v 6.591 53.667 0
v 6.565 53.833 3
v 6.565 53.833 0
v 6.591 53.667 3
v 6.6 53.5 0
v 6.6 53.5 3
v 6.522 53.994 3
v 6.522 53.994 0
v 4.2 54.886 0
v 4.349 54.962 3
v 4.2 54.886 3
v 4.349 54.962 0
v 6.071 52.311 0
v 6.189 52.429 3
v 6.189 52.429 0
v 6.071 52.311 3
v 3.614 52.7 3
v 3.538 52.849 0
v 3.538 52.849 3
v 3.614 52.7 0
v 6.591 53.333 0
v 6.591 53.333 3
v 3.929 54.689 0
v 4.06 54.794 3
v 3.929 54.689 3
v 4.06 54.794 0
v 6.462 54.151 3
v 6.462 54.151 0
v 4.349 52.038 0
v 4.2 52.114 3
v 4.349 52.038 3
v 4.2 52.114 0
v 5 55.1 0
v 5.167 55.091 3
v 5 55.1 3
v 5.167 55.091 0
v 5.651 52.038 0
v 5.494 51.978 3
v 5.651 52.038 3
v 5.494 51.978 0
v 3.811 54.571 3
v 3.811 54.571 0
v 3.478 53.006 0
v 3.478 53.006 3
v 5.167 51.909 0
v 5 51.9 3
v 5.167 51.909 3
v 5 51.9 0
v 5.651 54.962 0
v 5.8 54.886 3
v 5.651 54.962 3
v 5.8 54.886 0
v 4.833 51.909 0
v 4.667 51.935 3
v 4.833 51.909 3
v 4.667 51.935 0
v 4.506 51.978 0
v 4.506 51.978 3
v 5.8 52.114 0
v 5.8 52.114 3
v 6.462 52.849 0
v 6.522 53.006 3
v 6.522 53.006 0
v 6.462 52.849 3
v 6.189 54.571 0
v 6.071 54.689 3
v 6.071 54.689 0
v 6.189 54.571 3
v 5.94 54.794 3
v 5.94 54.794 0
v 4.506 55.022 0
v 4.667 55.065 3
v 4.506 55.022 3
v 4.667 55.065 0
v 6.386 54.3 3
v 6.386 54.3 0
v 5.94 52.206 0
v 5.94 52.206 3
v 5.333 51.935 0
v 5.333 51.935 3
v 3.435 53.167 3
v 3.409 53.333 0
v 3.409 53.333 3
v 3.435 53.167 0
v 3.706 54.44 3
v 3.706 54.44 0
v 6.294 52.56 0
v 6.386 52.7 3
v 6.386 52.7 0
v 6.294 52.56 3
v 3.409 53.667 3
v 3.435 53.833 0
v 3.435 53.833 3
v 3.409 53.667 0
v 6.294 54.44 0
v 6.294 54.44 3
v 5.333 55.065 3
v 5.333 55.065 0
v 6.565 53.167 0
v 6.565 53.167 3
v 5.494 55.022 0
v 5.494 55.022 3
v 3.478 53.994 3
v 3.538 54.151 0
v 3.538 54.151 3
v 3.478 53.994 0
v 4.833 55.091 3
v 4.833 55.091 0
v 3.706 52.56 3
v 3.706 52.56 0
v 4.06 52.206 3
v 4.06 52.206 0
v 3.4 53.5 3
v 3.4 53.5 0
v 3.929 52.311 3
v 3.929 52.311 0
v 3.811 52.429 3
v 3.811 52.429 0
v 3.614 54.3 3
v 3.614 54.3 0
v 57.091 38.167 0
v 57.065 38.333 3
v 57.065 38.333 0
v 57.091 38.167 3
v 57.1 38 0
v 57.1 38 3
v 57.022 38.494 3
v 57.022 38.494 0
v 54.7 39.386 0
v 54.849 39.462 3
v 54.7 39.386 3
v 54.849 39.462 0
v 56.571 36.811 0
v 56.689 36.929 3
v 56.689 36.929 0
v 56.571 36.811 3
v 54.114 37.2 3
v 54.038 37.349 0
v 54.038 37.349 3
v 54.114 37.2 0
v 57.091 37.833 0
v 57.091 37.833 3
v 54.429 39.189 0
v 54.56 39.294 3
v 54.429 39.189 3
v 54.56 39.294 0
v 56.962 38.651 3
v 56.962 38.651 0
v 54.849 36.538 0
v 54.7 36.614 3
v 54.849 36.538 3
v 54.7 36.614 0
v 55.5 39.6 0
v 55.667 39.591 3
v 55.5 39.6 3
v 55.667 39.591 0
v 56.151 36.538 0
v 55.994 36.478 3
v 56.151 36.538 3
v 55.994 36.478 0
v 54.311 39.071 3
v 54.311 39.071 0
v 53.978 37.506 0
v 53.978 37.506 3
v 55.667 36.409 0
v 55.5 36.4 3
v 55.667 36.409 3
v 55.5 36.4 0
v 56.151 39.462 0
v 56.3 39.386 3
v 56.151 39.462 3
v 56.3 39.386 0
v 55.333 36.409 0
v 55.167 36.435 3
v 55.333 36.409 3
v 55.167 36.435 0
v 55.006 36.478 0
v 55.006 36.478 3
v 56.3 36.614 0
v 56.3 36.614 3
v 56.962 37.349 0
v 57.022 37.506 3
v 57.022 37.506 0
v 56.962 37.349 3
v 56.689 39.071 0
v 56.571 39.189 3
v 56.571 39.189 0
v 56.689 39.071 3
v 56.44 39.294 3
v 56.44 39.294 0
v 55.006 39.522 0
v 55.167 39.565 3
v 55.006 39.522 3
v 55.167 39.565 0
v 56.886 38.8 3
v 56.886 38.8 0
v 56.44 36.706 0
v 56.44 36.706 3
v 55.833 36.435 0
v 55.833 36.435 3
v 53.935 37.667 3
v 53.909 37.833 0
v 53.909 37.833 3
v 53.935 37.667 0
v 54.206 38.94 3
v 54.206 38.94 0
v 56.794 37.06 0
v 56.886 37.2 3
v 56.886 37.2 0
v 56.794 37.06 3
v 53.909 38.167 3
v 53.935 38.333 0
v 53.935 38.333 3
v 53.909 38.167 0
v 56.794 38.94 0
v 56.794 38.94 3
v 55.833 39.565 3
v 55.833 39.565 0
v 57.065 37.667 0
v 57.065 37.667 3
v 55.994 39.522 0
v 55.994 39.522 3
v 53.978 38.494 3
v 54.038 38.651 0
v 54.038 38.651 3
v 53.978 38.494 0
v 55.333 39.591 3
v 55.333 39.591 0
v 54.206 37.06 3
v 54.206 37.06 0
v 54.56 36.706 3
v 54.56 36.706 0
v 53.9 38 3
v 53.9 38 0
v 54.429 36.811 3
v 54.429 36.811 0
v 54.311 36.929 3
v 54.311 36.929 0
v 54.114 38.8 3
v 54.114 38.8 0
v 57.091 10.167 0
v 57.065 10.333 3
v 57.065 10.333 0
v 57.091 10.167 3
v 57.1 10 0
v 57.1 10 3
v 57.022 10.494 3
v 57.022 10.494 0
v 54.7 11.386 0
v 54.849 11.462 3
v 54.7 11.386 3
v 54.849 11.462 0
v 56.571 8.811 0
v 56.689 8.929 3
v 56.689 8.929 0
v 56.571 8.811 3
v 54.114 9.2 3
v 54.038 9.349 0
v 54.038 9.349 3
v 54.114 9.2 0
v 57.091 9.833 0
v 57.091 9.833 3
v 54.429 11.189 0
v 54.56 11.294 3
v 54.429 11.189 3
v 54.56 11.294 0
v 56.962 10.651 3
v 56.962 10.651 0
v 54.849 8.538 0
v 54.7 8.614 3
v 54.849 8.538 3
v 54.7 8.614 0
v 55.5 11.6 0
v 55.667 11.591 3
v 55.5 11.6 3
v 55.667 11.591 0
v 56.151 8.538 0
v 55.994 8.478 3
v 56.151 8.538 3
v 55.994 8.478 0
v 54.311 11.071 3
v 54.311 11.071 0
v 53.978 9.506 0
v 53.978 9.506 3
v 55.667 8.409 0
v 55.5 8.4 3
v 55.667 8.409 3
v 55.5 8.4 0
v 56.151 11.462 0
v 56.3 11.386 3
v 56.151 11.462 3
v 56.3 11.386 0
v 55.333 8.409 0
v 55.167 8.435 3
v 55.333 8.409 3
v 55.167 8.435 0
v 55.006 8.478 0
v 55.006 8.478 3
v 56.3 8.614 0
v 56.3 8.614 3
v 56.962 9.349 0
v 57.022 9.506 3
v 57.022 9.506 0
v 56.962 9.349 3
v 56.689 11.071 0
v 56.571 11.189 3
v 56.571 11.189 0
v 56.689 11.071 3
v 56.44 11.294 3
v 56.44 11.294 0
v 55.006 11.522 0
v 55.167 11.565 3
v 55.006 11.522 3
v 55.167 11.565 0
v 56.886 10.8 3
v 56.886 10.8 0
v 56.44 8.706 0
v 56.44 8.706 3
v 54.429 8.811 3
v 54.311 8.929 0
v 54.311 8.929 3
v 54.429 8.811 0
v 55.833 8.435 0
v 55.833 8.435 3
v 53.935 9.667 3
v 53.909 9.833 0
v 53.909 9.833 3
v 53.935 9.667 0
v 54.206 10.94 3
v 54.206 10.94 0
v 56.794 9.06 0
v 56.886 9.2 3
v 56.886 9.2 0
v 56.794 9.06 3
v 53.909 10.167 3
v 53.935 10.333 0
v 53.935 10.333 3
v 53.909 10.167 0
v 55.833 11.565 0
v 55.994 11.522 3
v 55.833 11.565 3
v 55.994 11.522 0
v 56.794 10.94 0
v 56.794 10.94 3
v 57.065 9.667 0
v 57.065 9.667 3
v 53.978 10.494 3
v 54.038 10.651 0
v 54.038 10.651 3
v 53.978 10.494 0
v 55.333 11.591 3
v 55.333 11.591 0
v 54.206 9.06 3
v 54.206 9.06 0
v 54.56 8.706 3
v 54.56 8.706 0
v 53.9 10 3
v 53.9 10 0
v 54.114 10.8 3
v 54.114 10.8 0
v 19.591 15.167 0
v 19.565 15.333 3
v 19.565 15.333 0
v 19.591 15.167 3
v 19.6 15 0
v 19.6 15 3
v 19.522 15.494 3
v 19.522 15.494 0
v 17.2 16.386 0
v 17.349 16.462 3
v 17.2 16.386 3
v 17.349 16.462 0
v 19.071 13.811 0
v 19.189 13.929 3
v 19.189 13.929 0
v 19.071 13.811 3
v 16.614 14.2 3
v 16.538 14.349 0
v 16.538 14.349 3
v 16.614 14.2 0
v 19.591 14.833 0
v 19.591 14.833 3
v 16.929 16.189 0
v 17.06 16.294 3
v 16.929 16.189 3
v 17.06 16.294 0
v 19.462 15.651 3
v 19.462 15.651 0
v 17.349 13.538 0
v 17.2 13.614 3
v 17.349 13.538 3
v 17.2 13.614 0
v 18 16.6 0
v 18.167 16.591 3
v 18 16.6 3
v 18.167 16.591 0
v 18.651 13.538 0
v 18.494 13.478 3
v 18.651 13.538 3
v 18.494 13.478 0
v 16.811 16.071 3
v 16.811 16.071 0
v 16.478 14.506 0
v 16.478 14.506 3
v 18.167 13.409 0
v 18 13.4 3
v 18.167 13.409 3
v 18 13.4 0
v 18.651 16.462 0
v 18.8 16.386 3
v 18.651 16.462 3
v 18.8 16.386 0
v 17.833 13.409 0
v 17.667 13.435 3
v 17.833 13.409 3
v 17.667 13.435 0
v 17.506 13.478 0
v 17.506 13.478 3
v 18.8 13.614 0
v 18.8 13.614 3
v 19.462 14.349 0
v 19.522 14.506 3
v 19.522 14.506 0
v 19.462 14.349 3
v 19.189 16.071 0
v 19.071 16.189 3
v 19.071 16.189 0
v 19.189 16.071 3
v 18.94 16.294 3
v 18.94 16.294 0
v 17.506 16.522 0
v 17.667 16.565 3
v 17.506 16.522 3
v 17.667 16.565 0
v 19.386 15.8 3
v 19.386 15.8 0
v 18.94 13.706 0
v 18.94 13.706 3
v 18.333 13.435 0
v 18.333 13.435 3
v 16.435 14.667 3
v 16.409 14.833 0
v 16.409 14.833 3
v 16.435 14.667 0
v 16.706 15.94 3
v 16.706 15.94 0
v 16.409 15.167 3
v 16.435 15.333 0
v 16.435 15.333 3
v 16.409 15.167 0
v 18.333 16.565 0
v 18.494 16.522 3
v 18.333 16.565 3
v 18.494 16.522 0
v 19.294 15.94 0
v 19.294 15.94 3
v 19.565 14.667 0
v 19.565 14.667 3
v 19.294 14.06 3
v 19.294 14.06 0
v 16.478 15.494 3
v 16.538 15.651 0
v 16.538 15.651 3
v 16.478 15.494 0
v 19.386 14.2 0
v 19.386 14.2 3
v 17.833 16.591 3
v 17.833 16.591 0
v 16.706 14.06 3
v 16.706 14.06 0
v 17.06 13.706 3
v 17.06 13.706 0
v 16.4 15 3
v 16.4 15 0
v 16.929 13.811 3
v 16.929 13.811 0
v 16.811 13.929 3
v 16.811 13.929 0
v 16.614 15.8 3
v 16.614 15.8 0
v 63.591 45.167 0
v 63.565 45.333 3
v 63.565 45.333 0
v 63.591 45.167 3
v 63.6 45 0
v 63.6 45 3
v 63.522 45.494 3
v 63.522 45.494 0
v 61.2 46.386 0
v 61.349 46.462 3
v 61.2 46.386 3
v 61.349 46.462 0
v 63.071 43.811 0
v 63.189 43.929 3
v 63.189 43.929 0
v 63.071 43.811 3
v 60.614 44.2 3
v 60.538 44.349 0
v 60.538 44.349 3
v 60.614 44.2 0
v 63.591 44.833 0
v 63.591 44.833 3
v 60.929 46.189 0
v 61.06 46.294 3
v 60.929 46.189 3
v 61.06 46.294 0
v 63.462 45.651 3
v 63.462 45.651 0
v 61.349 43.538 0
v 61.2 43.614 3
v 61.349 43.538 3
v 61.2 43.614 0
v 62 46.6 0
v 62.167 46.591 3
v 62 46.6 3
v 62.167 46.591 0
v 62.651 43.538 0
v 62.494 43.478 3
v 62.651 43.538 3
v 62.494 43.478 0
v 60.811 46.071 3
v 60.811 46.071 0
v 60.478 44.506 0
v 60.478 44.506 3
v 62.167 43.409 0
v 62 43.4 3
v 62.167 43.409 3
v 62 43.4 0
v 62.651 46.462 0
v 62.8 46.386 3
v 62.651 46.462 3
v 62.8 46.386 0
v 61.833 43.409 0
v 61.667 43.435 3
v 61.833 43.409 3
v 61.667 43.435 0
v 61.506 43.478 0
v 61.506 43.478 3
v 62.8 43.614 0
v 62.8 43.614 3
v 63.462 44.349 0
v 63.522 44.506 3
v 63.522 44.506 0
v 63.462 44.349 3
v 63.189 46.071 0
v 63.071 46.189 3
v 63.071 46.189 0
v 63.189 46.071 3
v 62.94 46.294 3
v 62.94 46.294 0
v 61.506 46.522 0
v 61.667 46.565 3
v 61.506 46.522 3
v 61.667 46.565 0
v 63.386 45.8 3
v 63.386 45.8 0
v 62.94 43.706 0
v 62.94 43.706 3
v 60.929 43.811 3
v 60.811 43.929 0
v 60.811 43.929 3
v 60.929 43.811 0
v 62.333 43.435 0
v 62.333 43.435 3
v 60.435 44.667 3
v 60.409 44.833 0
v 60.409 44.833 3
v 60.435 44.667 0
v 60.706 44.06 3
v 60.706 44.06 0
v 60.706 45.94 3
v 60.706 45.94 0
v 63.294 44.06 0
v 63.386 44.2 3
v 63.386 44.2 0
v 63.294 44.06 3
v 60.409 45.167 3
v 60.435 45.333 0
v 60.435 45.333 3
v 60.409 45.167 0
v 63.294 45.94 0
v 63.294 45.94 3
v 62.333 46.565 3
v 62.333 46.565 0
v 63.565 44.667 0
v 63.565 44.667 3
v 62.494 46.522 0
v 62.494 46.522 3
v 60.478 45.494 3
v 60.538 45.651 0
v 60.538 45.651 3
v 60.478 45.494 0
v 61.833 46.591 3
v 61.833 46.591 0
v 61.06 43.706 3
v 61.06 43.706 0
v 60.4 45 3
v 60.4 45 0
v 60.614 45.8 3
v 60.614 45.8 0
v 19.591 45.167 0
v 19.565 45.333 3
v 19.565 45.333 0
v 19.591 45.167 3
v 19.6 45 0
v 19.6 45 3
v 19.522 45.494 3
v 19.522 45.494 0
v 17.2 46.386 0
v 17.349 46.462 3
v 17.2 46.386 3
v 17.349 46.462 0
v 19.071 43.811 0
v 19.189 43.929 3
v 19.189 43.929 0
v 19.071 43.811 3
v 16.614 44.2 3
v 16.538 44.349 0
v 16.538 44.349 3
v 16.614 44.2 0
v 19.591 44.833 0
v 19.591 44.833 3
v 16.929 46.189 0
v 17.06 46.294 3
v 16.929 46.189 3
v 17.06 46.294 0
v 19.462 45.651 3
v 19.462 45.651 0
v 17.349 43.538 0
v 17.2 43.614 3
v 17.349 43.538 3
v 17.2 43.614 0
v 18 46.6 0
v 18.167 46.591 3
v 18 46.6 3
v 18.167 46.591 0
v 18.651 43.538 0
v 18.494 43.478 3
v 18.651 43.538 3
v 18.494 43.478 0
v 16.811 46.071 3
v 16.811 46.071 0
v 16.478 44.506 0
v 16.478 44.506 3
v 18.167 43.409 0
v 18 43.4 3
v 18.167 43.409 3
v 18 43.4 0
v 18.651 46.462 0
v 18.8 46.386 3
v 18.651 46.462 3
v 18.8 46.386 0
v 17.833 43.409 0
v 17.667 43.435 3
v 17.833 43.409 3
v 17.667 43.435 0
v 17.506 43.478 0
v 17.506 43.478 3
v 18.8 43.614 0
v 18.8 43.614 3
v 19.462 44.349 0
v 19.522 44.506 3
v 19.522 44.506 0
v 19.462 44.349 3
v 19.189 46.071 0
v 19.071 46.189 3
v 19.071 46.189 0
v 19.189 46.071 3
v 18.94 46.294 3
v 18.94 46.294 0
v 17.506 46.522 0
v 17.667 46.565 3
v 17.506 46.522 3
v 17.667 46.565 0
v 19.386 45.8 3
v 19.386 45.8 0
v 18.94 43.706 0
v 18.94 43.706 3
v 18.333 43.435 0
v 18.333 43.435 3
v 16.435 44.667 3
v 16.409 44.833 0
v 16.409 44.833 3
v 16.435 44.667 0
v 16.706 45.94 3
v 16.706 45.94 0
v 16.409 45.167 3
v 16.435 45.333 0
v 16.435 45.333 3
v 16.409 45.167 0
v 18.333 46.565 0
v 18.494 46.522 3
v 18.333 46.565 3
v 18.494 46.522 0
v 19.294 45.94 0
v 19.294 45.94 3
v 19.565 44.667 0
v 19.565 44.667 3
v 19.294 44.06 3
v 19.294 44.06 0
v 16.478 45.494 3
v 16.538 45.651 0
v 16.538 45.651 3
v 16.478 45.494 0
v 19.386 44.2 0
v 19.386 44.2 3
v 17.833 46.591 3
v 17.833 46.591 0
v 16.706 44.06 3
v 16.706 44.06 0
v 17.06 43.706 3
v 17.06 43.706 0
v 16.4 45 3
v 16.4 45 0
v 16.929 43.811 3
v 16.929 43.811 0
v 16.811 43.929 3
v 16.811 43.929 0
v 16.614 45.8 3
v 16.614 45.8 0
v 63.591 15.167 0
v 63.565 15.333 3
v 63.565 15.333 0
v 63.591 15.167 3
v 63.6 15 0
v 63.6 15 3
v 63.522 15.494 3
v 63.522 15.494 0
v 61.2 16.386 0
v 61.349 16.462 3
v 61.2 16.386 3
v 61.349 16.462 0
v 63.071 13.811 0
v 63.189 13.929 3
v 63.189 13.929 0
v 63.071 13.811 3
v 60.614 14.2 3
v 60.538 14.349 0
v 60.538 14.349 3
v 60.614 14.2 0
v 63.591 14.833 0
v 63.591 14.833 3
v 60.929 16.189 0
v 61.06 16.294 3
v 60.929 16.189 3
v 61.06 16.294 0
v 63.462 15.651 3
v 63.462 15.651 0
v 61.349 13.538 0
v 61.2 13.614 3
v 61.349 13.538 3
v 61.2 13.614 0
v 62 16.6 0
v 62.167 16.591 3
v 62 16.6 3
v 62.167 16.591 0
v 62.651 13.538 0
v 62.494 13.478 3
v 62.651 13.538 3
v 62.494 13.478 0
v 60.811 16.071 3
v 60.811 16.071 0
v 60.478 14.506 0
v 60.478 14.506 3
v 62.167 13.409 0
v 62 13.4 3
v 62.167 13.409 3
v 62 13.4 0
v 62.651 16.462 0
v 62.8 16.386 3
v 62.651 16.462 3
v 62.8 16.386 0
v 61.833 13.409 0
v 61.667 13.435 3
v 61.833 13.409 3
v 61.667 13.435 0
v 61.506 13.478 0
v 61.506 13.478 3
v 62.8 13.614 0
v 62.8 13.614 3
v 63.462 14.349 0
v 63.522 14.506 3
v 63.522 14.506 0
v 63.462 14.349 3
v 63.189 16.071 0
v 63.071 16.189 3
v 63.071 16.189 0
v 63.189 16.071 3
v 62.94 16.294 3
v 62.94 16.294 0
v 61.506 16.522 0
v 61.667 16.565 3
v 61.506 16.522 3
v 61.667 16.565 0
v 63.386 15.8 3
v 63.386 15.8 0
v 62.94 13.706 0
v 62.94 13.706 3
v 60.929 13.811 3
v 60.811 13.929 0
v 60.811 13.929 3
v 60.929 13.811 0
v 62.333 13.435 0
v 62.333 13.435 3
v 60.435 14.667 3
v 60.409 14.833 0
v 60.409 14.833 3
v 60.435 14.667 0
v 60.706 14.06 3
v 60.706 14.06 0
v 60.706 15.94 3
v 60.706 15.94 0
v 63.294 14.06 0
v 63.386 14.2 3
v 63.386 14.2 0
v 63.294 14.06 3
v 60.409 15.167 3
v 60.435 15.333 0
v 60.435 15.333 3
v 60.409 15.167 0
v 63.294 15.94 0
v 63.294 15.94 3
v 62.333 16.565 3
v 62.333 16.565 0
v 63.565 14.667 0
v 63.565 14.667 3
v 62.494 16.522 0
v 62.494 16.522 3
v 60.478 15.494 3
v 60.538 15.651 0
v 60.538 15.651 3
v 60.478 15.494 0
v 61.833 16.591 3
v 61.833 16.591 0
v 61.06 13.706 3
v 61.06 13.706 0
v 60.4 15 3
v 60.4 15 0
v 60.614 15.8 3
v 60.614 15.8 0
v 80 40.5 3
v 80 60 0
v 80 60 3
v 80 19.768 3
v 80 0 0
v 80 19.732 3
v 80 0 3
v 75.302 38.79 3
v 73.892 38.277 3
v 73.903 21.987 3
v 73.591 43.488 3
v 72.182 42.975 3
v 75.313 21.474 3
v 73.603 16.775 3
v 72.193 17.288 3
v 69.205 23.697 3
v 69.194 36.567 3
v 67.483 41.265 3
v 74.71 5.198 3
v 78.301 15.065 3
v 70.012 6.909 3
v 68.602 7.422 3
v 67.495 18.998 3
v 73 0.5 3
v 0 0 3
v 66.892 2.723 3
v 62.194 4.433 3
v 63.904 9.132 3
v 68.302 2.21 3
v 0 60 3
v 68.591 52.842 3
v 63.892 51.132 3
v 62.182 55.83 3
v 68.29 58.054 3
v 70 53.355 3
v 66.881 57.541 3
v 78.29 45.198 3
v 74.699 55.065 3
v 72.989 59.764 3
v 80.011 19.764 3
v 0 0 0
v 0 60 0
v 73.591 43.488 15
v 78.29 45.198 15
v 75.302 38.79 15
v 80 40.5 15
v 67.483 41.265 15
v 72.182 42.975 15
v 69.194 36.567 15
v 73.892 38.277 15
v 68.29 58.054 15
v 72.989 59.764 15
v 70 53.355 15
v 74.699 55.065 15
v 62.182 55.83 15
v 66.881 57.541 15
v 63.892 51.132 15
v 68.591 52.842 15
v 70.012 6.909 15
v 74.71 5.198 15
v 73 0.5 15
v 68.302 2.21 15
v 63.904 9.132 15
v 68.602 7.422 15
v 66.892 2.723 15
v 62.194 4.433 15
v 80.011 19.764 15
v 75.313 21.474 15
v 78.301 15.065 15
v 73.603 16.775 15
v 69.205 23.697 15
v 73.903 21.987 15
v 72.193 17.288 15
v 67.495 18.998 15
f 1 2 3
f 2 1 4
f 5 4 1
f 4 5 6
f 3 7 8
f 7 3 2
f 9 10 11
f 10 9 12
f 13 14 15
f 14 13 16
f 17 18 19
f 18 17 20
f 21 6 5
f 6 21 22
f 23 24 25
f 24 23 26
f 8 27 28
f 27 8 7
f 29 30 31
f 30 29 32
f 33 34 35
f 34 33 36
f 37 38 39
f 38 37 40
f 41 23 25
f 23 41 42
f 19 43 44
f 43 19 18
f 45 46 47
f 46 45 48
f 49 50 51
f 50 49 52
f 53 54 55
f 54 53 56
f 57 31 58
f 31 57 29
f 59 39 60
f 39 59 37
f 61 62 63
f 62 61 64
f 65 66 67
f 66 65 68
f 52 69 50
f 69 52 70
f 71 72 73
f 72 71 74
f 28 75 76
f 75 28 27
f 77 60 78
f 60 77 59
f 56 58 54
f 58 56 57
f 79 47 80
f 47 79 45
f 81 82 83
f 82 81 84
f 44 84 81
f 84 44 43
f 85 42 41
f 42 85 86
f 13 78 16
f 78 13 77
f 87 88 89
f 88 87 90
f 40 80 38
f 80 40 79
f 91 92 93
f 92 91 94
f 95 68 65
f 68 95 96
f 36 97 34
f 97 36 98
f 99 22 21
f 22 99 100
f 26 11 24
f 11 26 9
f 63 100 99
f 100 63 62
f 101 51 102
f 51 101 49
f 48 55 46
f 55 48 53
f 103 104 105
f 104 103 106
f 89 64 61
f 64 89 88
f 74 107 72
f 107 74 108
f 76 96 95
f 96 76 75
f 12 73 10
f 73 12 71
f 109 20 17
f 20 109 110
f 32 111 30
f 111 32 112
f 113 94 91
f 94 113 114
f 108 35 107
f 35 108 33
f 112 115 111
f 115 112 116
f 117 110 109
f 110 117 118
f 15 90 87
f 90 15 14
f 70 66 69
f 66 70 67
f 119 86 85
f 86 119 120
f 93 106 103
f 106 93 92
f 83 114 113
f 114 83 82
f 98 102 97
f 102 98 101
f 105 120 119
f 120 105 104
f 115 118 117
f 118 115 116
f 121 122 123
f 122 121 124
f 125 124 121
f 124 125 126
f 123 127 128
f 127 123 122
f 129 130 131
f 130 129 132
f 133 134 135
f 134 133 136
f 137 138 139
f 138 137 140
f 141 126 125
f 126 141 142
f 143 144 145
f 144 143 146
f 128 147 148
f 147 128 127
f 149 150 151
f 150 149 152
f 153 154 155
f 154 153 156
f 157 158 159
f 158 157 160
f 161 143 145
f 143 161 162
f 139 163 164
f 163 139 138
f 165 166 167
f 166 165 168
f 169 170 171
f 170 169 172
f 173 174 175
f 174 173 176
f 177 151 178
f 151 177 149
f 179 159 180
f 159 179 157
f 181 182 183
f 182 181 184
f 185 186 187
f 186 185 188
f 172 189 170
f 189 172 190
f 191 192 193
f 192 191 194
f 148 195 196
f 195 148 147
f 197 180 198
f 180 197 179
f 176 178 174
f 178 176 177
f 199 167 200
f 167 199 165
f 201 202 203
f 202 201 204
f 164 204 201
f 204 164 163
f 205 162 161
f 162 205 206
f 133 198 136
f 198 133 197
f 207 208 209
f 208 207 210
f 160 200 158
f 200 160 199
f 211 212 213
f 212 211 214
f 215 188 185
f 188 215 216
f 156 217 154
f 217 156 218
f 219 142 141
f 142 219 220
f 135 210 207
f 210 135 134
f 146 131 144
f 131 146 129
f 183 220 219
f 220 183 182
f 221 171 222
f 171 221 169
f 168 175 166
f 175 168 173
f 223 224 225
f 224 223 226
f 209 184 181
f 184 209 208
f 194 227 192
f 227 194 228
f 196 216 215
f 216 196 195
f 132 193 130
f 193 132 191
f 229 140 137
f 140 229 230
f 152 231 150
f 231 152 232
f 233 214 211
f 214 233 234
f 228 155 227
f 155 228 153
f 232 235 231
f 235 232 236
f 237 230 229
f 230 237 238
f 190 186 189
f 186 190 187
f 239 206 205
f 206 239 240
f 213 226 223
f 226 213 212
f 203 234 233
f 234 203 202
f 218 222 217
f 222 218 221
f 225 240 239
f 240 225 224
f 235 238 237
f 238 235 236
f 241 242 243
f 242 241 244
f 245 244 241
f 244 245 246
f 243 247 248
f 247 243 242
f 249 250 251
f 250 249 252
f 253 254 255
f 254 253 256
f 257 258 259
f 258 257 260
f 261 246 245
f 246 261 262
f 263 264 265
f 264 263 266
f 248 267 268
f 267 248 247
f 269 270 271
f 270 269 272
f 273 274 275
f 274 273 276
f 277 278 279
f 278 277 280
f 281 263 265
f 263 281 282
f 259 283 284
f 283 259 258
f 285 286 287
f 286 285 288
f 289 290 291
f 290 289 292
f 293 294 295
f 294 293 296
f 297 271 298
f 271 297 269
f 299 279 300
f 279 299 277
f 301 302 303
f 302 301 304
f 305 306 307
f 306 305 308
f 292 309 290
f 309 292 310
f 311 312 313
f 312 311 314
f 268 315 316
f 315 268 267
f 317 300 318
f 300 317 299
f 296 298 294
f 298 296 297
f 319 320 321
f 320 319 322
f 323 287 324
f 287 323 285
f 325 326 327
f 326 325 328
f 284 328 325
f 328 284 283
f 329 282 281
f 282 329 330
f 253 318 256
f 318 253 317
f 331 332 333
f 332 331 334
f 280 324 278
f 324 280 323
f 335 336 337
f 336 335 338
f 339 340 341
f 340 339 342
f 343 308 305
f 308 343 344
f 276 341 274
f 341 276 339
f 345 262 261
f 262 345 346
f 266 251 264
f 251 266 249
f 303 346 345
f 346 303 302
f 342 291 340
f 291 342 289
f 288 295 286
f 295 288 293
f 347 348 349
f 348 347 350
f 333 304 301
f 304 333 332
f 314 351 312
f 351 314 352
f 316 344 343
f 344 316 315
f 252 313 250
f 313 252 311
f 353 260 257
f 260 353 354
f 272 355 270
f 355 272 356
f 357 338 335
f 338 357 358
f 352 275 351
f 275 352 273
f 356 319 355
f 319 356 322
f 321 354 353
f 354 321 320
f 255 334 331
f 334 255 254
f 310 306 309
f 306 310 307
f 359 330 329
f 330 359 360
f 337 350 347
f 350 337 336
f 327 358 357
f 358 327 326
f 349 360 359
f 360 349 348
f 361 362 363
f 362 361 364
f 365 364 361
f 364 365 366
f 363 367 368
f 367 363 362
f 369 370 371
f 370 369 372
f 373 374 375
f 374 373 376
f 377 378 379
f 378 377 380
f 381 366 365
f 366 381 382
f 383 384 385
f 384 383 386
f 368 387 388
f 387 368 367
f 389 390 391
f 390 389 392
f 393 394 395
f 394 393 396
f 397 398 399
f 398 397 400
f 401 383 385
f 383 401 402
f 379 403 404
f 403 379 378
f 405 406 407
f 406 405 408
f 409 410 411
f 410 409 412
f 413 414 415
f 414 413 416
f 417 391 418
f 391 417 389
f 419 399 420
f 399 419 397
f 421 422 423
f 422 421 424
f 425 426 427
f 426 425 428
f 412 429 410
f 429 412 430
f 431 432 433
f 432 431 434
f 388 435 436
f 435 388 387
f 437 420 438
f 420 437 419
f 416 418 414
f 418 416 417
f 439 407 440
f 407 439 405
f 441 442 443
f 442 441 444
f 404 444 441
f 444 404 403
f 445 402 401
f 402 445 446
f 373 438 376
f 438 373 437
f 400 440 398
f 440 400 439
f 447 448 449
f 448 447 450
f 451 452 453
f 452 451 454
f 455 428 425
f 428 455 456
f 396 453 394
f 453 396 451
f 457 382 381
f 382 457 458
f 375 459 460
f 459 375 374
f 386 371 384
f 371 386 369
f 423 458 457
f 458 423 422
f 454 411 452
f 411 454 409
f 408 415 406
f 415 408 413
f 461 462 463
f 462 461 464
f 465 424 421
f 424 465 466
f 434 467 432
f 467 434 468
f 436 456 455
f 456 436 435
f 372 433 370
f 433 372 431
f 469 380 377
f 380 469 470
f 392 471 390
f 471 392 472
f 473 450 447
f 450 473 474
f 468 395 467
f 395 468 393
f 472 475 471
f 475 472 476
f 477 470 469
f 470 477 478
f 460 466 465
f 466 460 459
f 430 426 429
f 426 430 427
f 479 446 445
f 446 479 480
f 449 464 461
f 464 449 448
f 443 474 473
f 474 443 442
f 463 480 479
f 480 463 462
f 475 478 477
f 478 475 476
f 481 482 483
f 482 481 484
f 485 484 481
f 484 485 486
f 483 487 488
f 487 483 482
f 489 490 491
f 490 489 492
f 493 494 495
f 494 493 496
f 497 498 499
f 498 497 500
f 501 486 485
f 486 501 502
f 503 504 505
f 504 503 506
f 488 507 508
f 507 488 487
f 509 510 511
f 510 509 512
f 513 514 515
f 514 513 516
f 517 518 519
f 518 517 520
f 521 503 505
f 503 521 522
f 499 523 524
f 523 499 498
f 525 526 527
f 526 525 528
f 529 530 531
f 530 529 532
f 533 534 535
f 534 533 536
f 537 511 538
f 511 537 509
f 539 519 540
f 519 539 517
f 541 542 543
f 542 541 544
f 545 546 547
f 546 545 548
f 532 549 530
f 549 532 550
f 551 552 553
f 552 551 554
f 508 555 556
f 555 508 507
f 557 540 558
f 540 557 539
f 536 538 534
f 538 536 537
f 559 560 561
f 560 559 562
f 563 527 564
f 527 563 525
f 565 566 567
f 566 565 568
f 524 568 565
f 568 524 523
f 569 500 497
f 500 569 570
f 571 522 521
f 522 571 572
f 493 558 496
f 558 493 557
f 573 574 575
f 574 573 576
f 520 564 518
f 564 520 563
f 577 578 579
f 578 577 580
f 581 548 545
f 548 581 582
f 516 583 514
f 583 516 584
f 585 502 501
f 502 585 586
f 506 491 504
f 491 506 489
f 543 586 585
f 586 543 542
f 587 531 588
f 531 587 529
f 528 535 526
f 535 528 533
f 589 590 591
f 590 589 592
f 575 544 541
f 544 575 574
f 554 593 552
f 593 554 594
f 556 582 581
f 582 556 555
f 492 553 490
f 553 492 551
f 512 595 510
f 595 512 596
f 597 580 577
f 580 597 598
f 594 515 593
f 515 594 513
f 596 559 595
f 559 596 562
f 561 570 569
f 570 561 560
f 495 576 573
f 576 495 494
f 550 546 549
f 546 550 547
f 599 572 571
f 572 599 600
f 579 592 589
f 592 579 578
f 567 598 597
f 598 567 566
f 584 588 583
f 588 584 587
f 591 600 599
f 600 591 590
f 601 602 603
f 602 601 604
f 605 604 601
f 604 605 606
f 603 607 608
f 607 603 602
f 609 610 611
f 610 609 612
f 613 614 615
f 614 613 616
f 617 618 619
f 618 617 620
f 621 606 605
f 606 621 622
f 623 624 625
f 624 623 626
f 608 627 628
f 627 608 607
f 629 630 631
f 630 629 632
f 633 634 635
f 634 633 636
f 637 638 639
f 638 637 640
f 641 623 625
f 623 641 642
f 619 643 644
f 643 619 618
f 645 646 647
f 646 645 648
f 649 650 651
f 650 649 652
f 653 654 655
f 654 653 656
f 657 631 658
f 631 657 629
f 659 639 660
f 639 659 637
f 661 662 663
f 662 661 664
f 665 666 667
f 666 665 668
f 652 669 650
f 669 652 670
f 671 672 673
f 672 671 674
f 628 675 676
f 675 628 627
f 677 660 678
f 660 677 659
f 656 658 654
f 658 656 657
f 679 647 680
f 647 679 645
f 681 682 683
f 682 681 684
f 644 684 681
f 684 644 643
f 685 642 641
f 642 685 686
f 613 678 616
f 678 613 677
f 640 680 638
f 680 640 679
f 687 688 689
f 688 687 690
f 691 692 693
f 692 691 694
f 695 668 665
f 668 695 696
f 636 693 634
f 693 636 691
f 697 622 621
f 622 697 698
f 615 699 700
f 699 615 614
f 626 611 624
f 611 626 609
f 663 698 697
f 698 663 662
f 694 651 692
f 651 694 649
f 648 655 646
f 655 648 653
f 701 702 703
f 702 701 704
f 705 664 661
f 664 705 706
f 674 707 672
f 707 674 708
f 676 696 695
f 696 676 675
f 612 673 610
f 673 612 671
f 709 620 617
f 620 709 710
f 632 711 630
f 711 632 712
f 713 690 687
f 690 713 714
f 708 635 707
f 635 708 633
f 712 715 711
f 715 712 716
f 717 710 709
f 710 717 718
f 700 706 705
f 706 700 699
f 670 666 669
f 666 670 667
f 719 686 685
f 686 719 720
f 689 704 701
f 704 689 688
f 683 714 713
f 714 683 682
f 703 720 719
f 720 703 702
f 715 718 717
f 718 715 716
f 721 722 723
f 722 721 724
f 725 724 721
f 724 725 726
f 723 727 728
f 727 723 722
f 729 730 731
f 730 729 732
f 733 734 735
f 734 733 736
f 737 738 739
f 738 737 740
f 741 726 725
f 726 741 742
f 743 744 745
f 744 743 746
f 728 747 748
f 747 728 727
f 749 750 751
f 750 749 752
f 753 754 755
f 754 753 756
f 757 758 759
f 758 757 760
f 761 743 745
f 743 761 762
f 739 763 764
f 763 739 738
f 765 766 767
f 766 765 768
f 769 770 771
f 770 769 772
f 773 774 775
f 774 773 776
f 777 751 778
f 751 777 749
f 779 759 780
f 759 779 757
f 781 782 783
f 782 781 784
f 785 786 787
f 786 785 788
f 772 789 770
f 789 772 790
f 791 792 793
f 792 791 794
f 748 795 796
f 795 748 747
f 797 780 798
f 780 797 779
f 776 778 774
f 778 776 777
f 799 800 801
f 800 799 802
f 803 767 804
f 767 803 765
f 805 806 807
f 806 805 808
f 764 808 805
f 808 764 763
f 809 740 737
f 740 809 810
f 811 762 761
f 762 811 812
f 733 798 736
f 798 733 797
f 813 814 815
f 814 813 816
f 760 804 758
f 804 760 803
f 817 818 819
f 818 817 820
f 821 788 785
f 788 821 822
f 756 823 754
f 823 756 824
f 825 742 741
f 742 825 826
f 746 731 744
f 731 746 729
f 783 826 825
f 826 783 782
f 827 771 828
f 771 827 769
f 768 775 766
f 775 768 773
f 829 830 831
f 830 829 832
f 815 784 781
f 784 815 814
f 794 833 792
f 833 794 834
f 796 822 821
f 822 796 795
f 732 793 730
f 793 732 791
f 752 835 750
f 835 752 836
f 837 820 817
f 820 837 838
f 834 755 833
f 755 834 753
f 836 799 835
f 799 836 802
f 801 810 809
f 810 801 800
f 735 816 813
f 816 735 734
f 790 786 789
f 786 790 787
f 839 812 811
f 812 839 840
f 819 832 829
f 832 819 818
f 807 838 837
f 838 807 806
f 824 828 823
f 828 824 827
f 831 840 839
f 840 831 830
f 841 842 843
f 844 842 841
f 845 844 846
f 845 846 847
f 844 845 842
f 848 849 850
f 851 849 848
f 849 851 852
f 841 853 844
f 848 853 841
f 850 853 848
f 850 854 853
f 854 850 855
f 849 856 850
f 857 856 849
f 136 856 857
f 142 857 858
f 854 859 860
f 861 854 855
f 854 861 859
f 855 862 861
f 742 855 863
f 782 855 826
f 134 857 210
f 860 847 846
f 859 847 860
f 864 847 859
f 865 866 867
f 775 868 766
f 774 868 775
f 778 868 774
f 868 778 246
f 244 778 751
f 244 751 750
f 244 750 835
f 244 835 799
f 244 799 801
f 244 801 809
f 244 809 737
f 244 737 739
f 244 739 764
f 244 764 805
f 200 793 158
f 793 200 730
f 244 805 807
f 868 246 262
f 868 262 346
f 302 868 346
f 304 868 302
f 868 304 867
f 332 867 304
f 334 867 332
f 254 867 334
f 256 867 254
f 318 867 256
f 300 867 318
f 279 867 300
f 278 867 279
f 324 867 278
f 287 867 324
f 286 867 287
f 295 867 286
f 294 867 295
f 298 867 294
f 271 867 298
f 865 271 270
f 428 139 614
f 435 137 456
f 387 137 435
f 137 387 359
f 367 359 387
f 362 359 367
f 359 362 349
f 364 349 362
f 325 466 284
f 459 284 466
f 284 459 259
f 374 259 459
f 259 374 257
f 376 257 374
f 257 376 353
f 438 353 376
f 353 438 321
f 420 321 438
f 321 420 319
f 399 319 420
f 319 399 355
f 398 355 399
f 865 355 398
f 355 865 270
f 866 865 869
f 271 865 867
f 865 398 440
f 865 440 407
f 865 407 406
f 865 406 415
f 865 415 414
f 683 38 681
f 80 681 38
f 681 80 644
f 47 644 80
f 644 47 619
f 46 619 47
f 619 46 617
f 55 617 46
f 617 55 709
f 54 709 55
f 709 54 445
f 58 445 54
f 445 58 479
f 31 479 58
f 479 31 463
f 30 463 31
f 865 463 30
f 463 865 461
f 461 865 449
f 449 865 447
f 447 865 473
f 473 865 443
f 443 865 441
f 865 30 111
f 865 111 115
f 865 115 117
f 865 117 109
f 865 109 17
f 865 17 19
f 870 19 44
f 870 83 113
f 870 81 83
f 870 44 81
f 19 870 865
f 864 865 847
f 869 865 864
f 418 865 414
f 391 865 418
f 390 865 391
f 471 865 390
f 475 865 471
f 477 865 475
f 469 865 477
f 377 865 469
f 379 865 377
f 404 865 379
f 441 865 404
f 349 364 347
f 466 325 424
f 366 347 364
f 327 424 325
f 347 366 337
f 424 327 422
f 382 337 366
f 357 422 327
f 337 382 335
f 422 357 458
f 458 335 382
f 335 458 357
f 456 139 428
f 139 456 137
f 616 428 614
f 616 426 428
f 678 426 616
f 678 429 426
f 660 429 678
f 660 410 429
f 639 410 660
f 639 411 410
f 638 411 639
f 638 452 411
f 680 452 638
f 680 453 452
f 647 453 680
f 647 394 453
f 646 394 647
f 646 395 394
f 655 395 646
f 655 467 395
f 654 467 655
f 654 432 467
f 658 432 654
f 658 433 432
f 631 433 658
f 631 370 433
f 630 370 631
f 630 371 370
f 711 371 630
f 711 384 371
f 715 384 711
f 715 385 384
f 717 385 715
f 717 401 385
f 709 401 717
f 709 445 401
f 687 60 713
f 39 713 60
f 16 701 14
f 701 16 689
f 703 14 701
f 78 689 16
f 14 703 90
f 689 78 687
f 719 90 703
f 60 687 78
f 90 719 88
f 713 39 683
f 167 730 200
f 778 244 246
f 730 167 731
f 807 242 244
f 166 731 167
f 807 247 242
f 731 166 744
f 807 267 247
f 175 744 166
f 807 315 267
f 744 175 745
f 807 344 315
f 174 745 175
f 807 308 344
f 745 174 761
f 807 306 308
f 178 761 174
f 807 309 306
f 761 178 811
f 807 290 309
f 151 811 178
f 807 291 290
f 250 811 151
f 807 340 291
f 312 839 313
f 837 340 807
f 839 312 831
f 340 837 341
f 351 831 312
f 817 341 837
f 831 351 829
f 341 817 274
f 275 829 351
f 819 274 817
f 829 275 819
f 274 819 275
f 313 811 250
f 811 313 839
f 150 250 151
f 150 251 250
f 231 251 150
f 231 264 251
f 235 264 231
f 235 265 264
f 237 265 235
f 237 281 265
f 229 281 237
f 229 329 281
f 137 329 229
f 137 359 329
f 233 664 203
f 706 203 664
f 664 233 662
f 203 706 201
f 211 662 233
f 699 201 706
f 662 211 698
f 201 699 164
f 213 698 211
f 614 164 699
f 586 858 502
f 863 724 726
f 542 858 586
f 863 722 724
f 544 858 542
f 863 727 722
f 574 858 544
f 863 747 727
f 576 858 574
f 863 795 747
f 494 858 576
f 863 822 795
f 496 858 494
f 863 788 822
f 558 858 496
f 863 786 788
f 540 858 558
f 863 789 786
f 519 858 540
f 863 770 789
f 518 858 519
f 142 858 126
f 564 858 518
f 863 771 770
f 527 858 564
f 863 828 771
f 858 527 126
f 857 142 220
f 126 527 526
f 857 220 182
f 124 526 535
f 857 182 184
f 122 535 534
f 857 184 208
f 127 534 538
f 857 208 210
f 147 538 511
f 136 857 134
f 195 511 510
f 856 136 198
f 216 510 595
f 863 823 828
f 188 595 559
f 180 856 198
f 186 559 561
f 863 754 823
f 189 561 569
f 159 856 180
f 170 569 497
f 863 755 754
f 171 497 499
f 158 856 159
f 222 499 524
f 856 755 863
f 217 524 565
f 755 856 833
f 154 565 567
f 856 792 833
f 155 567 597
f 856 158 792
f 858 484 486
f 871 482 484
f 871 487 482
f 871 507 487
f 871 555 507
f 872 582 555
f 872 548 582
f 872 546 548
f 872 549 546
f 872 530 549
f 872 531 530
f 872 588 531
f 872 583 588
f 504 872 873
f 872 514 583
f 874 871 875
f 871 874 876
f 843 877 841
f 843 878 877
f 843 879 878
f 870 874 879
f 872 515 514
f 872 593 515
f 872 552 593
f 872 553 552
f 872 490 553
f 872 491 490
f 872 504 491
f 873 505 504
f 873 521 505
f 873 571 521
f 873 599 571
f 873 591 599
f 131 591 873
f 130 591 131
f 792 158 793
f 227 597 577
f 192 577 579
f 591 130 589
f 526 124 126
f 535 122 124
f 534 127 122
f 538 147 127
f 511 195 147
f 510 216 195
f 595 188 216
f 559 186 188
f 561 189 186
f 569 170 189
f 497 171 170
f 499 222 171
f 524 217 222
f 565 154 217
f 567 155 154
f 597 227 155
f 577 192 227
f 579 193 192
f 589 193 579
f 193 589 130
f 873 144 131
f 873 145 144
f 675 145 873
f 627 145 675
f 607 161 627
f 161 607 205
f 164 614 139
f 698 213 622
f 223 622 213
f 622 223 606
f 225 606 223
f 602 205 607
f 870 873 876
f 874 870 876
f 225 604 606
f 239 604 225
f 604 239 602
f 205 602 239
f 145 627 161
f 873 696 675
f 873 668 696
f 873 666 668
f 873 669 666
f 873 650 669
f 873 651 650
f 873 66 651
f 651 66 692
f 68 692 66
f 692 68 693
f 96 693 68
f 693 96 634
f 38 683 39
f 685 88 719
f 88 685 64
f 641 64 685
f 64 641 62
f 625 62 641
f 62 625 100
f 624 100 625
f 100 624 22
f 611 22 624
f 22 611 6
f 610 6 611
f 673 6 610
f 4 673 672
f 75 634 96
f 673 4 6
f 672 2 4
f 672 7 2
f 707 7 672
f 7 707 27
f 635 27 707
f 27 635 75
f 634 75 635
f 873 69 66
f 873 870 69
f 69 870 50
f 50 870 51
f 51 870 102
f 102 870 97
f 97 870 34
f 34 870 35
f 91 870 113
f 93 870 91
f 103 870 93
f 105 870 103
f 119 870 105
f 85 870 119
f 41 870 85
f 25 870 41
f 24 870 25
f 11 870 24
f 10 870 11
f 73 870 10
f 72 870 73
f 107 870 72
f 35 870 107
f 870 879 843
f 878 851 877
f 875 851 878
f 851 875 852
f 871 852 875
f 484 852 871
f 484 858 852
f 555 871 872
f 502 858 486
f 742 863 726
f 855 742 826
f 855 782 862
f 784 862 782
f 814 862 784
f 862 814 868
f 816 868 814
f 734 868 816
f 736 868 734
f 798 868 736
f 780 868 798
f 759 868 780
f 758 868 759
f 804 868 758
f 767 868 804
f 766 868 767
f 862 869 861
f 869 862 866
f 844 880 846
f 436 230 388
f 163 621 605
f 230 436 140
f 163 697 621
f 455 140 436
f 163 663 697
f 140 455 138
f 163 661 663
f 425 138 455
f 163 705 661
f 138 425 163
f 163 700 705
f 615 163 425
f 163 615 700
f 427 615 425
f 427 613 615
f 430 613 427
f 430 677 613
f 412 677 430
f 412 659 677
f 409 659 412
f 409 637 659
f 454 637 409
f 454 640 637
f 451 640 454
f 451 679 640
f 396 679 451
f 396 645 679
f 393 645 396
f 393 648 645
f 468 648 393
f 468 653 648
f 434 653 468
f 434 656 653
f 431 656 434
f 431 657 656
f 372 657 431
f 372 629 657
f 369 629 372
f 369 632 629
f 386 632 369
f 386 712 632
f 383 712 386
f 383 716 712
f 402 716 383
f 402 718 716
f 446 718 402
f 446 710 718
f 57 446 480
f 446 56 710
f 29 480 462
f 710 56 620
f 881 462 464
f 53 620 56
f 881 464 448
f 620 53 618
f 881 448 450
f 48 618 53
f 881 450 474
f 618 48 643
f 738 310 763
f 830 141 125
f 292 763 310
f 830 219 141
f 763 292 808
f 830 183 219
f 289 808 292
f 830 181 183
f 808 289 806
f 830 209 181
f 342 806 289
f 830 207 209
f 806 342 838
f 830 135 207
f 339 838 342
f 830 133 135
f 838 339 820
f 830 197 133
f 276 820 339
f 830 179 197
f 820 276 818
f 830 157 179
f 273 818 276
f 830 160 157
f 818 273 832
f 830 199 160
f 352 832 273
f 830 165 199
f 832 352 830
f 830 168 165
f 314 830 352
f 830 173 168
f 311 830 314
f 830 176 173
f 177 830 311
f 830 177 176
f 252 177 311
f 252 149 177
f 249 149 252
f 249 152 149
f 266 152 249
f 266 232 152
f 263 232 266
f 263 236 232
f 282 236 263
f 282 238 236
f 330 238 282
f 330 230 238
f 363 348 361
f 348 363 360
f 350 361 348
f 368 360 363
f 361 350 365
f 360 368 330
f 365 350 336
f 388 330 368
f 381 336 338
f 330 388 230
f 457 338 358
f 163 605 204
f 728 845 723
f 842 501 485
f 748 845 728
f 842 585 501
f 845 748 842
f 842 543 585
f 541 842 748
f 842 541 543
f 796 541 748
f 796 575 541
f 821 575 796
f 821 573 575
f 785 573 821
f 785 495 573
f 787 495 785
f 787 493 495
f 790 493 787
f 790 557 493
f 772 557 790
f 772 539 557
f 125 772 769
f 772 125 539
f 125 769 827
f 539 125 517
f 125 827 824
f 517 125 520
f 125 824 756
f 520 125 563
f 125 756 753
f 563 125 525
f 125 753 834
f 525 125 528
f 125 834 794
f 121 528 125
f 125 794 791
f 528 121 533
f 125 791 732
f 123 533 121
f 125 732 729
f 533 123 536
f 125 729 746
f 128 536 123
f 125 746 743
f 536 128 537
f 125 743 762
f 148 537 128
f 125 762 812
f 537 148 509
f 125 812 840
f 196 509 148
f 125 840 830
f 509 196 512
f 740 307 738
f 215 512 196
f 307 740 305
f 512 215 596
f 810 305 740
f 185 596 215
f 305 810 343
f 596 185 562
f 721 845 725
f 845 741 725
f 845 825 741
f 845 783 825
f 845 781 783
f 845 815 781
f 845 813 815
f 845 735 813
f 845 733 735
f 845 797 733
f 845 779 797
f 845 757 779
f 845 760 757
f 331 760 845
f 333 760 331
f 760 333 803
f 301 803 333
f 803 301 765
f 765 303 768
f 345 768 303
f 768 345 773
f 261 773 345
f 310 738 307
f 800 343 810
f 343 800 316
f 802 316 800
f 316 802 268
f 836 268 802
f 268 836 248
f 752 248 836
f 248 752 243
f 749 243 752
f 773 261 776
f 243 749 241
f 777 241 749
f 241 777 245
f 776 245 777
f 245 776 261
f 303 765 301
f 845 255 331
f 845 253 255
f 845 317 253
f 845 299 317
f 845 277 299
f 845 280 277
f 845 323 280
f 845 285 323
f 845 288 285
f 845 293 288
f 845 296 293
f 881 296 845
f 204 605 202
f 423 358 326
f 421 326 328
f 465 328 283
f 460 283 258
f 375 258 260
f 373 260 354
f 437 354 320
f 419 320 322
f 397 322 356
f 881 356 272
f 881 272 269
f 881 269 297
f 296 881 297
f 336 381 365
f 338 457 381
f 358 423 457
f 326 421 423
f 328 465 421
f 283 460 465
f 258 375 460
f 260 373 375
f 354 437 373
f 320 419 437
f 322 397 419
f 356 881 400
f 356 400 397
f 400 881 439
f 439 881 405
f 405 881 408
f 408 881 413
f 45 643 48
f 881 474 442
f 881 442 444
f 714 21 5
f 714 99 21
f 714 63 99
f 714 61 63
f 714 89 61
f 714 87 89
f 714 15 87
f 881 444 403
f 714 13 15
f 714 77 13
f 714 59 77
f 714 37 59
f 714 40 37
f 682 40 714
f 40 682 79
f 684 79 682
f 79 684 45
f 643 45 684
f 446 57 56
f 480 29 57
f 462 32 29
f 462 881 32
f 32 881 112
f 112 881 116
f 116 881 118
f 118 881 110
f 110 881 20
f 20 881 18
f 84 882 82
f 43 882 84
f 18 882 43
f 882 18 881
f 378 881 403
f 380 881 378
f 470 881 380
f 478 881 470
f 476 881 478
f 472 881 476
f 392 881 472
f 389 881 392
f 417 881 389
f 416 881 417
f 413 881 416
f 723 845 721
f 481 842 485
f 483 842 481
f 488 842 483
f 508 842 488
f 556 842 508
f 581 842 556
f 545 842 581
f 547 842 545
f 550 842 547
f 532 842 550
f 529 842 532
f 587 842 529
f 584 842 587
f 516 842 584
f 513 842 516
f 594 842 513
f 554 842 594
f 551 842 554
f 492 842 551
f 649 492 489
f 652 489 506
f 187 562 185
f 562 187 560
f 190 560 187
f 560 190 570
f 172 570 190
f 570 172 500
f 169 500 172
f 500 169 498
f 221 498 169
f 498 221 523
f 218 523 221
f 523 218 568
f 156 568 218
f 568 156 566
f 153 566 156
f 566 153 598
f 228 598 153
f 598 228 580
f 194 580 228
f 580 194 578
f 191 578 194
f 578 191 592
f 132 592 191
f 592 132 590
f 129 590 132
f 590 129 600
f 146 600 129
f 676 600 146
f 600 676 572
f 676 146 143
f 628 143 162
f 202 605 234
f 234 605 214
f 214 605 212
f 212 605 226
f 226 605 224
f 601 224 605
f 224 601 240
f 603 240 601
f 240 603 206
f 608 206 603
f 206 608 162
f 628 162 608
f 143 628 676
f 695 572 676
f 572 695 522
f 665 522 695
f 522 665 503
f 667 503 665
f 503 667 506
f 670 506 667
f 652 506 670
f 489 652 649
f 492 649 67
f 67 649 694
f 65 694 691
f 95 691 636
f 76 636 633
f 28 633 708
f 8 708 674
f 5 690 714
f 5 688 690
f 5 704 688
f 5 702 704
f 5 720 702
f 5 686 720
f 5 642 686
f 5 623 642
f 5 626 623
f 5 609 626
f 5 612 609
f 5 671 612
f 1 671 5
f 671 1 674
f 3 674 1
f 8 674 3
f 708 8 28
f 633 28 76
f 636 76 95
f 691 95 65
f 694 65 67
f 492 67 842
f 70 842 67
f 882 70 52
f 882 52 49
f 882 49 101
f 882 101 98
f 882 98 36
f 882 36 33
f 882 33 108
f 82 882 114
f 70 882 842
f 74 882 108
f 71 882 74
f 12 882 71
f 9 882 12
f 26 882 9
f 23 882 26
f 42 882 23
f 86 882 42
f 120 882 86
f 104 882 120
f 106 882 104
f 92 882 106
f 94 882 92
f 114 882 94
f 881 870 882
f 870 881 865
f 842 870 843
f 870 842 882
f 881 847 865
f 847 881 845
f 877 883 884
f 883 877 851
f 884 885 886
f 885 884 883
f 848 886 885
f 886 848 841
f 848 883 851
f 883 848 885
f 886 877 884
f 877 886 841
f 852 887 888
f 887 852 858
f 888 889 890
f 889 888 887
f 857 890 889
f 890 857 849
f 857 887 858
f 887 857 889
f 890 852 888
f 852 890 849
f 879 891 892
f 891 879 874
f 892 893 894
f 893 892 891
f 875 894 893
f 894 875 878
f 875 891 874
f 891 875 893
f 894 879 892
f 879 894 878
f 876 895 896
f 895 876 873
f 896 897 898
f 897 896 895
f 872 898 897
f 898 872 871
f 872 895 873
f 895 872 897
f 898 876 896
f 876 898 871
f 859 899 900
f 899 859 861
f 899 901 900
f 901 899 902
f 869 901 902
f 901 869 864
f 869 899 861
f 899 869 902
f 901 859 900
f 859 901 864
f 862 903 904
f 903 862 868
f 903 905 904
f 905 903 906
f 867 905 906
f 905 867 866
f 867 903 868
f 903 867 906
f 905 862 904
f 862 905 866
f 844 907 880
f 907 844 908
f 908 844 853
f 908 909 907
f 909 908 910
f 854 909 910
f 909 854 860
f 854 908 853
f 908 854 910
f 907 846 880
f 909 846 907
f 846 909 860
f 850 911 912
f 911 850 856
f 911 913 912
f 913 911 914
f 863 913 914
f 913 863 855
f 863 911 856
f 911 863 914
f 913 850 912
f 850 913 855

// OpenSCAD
plate_len      = 80;       
plate_wid      = 60;       
plate_thk      = 3;        
uno_hole_diam  = 3.2;

uno_origin     = [5, 10];  

uno_hole_pts = [
    [0,   43.5],
    [50.5, 28],
    [50.5, 0]
];

mount_origin = [18, 15];

mount_pts  = [
    [0,   0],
    [44, 30],
    [0, 30],
    [44, 0]
];
module plate_body() {
    translate([0,0,0])
        cube([plate_len, plate_wid, plate_thk], center=false);
}

module drill_hole(x, y, d) {
    translate([x, y, -0.1]) 
        cylinder(h=plate_thk + 0.2, r=d/2, $fn=60);
}

module uno_holes() {
    for (pt = uno_hole_pts) {
        drill_hole(uno_origin[0] + pt[0], uno_origin[1] + pt[1], uno_hole_diam);
    }
}
module mount() {
    for (pt = mount_pts) {
        drill_hole(mount_origin[0] + pt[0], mount_origin[1] + pt[1], uno_hole_diam);
    }
}

module sensor() {

    block_size    = [5, 5, 12];
    pitch         = [15.5, 6.5];
    rows          = 2;
    cols          = 2;

    for (i = [0:cols-1]) {
        for (j = [0:rows-1]) {
            translate([i*pitch[0], j*pitch[1], 0])
                cube(block_size, center=false);
        }
    }
}
union(){
difference() {
    plate_body();
    uno_holes();
    mount();
}

translate([80,40.5,3])
rotate([0,0,110])
sensor();
translate([73,0.5,3])
rotate([0,0,70])
sensor();
}
